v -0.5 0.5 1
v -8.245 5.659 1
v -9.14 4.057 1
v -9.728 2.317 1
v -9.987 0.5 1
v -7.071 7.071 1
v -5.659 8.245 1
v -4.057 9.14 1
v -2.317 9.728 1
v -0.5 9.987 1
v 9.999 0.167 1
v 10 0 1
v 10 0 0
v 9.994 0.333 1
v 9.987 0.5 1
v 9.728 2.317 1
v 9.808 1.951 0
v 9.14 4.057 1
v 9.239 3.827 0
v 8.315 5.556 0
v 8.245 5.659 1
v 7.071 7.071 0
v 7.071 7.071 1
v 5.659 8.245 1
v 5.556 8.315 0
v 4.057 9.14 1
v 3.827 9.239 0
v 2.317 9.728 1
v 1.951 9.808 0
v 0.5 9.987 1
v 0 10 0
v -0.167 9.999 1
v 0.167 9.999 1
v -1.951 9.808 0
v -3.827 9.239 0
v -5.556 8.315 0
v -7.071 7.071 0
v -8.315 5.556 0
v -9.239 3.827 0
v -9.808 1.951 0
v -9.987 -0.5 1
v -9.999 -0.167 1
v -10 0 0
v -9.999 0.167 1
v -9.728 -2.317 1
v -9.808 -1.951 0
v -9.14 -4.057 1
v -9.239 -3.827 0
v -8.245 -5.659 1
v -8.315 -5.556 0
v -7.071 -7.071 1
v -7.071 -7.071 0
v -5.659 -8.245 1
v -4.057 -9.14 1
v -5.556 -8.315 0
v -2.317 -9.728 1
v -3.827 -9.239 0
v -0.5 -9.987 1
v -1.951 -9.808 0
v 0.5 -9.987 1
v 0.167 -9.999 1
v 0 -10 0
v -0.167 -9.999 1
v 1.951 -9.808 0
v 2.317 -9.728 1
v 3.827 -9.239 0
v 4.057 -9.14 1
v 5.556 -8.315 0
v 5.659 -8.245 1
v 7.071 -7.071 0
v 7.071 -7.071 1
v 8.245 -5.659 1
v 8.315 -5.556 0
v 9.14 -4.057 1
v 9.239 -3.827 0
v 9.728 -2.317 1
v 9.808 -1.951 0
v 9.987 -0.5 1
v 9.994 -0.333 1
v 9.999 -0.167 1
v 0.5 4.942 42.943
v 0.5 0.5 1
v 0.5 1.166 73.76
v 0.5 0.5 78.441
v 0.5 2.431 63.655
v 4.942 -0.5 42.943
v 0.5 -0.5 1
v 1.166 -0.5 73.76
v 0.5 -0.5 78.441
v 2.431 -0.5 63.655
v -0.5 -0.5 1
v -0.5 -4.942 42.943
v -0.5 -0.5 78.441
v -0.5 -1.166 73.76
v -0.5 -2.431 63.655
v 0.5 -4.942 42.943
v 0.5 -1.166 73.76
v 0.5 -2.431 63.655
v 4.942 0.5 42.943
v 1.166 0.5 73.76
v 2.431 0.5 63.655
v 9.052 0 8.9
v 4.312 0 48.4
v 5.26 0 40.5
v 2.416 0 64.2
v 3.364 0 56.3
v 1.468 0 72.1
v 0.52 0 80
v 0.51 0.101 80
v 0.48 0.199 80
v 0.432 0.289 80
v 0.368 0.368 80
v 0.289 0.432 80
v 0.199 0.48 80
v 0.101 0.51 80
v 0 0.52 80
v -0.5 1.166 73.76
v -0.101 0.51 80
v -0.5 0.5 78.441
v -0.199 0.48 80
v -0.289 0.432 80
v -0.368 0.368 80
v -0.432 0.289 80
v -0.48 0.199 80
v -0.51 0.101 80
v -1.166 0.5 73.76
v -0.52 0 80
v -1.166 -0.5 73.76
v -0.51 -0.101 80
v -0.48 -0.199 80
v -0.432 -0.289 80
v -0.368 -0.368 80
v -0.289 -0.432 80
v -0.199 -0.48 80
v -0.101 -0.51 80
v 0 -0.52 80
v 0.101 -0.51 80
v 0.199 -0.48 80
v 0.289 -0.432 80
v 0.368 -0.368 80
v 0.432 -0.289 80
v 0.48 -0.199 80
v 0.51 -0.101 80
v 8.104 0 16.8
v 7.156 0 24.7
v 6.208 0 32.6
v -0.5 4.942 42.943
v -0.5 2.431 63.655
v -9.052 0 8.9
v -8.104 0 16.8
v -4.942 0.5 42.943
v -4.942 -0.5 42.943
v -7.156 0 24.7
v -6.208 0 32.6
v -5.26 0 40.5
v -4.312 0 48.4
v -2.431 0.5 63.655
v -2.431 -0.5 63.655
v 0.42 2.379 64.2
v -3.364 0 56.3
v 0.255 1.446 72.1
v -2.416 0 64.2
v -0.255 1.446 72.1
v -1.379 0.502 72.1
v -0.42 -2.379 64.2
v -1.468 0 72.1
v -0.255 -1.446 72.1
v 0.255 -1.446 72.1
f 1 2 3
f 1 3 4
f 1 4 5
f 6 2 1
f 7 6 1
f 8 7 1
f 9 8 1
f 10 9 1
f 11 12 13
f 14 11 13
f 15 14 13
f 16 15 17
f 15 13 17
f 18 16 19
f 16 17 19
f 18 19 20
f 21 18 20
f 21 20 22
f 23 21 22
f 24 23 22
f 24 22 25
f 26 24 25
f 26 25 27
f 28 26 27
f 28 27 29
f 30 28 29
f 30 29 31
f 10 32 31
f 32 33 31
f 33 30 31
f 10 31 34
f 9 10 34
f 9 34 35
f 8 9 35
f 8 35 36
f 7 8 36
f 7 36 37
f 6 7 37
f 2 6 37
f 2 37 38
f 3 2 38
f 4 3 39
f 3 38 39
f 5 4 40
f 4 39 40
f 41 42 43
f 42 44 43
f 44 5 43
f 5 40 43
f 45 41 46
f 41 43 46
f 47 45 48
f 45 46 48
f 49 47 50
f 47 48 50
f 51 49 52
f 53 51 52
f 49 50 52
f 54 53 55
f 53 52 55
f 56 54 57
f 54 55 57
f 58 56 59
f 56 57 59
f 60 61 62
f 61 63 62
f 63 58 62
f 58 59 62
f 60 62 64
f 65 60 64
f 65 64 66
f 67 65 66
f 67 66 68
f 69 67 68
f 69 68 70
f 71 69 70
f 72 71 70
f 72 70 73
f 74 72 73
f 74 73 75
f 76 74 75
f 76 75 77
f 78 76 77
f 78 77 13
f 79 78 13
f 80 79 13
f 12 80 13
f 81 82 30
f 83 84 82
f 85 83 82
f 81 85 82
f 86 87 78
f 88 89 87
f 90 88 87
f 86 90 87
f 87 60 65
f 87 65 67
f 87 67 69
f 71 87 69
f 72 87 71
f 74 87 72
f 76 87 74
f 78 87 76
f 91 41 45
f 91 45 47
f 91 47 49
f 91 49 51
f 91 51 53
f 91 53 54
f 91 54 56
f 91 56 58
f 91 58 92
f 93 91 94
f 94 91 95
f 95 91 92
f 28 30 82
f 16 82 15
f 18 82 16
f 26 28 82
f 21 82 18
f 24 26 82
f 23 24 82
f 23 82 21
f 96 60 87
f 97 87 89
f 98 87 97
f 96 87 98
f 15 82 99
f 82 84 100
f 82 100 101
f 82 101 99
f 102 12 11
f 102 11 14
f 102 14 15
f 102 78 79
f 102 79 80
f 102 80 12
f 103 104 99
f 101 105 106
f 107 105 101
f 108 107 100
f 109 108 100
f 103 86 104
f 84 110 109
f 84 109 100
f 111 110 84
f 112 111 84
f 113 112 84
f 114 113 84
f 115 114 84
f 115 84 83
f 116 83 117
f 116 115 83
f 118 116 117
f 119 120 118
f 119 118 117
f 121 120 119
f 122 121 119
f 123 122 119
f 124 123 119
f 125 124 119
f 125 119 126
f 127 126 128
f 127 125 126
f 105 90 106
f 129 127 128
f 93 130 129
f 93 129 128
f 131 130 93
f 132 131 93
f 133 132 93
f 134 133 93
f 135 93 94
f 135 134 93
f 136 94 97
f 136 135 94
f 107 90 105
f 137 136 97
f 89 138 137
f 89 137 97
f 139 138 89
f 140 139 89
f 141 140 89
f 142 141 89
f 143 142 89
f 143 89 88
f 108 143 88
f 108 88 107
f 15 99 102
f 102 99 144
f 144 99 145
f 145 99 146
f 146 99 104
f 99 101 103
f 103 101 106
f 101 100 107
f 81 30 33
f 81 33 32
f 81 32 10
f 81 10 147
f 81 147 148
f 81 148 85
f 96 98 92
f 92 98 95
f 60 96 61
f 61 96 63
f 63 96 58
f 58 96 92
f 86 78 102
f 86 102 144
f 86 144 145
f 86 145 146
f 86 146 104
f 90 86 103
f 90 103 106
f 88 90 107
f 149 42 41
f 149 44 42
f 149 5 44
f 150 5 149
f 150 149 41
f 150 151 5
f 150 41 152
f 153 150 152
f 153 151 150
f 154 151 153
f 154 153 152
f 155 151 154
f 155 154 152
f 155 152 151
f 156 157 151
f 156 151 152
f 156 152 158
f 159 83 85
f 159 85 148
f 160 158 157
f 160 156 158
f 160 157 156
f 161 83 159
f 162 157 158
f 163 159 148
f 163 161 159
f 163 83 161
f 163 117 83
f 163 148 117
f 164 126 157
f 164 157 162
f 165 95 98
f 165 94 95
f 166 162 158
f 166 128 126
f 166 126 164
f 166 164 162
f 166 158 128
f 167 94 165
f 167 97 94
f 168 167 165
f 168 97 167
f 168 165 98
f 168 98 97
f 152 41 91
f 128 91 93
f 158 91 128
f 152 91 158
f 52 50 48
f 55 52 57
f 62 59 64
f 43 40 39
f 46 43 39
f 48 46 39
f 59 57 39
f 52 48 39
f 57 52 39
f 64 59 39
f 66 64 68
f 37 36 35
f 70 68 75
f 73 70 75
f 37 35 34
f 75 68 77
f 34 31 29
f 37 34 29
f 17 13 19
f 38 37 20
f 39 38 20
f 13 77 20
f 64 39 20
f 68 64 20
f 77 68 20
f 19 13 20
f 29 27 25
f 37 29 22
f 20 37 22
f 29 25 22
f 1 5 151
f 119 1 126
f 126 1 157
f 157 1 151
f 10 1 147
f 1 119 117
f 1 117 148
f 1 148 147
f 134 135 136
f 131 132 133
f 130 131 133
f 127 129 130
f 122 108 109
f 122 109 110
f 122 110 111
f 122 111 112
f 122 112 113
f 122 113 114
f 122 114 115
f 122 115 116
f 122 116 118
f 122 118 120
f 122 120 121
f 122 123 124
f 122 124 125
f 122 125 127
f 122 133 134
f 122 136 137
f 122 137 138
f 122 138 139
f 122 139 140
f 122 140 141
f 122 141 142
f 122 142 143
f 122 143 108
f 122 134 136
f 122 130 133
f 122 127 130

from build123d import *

# Parameters (mm, degrees)
CYLINDER_R     = 10
CYLINDER_DEPTH = 1
BOX001_W       = 20
BOX001_H       = 1
BOX001_DEPTH   = 80
BOX_W          = 20
BOX_H          = 1
BOX_DEPTH      = 80


with BuildPart() as cylinder:
    # Cylinder → Cylinder (new body)
    with BuildSketch(Plane.XY):
        Circle(CYLINDER_R)
    extrude(amount=CYLINDER_DEPTH)


with BuildPart() as cube001:
    # Box001 → Box001 (new body)
    with BuildSketch(Plane(origin=(0.5, -10, 0), x_dir=(0, 1, 0), z_dir=(0, 0, 1))):
        with Locations((10, 0.5)):
            Rectangle(BOX001_W, BOX001_H)
    extrude(amount=BOX001_DEPTH)


with BuildPart() as fusion:
    # Box → Box (new body)
    with BuildSketch(Plane(origin=(-10, -0.5, 0), x_dir=(1, 0, 0), z_dir=(0, 0, 1))):
        with Locations((10, 0.5)):
            Rectangle(BOX_W, BOX_H)
    extrude(amount=BOX_DEPTH)

    # Fusion: union Cube001
    add(cube001.part)


with BuildPart() as groundanchor:
    # Cone → Cone (revolve)
    with BuildSketch(Plane(origin=(0, 0, 1), x_dir=(1, 0, 0), z_dir=(0, -1, 0))):
        Polygon((0, 0), (10, 0), (0.4, 80), (0, 80), align=None)
    revolve(axis=Axis((0, 0, 1), (0, 0, 1)))

    # Common: intersect Fusion
    add(fusion.part, mode=Mode.INTERSECT)

    # Fusion001: union Cylinder
    add(cylinder.part)


solid = groundanchor.part
